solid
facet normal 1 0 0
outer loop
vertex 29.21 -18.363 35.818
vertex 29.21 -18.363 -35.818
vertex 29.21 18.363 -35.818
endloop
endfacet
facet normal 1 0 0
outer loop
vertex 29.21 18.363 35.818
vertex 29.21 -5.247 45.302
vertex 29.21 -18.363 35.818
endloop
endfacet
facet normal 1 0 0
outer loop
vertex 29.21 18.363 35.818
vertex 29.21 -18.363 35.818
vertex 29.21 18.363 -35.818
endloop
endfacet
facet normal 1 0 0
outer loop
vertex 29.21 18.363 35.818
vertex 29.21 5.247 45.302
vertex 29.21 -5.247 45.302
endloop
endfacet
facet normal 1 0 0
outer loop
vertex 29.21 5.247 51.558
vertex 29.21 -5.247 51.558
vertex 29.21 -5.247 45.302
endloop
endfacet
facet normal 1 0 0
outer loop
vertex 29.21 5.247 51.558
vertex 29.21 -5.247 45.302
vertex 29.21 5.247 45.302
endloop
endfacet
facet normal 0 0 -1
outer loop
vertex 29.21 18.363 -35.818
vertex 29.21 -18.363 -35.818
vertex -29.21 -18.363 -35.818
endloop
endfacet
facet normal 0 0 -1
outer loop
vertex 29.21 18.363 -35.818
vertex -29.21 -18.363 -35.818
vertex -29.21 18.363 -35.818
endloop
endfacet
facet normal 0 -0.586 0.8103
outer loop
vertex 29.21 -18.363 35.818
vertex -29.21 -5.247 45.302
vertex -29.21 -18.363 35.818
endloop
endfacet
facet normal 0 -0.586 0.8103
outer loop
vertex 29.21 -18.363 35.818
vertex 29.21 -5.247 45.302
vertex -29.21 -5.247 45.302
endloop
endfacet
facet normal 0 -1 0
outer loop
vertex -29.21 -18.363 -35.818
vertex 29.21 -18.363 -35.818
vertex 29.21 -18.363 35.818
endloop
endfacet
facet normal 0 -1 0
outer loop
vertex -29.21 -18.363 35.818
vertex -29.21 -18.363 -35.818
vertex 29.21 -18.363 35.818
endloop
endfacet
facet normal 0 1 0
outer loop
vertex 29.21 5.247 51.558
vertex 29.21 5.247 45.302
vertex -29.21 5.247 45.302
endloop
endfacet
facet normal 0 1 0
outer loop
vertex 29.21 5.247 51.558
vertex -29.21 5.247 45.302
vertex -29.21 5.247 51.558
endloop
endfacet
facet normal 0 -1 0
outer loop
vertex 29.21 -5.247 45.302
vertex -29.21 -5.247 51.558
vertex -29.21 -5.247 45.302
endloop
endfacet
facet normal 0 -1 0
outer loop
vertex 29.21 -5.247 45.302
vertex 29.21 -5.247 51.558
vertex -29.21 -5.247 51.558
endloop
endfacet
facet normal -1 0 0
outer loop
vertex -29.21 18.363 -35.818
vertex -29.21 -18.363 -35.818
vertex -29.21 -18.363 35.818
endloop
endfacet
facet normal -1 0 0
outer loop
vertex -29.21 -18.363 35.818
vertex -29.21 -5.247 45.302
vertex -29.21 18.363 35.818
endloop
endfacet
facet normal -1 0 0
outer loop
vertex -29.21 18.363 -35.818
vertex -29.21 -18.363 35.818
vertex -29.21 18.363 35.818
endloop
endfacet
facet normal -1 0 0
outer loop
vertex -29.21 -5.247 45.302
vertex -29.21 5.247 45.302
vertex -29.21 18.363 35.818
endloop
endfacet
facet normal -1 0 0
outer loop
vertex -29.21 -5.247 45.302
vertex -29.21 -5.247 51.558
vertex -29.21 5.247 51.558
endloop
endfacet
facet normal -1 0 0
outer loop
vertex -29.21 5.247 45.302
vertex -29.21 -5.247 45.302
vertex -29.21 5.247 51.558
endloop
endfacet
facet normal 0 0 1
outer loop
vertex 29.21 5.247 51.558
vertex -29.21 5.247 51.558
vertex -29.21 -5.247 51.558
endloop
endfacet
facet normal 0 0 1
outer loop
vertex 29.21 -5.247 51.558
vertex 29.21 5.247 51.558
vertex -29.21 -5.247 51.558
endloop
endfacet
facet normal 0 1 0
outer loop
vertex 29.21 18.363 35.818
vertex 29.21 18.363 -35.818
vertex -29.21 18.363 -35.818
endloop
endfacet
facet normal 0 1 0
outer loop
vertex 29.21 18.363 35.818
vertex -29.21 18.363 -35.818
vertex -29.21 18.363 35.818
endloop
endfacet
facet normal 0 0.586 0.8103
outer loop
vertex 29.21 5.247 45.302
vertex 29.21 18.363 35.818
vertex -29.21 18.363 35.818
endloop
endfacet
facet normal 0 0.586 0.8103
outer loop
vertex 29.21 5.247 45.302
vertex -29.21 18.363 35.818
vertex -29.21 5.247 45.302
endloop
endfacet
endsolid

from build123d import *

# Parameters (mm, degrees)
F0_W     = 36.725904
F0_H     = 71.635686
F1_DEPTH = 29.21


with BuildPart() as f1:
    # F0 (on Right) → F1 (new body, symmetric)
    with BuildSketch(Plane.YZ):
        Rectangle(F0_W, F0_H)
        Polygon((-18.362952, 35.817843), (18.362952, 35.817843), (5.246557, 45.302007), (5.246557, 51.557515), (0, 51.557515), (-5.246557, 51.557515), (-5.246557, 45.302007), align=None)
    extrude(amount=F1_DEPTH, both=True)


solid = f1.part
